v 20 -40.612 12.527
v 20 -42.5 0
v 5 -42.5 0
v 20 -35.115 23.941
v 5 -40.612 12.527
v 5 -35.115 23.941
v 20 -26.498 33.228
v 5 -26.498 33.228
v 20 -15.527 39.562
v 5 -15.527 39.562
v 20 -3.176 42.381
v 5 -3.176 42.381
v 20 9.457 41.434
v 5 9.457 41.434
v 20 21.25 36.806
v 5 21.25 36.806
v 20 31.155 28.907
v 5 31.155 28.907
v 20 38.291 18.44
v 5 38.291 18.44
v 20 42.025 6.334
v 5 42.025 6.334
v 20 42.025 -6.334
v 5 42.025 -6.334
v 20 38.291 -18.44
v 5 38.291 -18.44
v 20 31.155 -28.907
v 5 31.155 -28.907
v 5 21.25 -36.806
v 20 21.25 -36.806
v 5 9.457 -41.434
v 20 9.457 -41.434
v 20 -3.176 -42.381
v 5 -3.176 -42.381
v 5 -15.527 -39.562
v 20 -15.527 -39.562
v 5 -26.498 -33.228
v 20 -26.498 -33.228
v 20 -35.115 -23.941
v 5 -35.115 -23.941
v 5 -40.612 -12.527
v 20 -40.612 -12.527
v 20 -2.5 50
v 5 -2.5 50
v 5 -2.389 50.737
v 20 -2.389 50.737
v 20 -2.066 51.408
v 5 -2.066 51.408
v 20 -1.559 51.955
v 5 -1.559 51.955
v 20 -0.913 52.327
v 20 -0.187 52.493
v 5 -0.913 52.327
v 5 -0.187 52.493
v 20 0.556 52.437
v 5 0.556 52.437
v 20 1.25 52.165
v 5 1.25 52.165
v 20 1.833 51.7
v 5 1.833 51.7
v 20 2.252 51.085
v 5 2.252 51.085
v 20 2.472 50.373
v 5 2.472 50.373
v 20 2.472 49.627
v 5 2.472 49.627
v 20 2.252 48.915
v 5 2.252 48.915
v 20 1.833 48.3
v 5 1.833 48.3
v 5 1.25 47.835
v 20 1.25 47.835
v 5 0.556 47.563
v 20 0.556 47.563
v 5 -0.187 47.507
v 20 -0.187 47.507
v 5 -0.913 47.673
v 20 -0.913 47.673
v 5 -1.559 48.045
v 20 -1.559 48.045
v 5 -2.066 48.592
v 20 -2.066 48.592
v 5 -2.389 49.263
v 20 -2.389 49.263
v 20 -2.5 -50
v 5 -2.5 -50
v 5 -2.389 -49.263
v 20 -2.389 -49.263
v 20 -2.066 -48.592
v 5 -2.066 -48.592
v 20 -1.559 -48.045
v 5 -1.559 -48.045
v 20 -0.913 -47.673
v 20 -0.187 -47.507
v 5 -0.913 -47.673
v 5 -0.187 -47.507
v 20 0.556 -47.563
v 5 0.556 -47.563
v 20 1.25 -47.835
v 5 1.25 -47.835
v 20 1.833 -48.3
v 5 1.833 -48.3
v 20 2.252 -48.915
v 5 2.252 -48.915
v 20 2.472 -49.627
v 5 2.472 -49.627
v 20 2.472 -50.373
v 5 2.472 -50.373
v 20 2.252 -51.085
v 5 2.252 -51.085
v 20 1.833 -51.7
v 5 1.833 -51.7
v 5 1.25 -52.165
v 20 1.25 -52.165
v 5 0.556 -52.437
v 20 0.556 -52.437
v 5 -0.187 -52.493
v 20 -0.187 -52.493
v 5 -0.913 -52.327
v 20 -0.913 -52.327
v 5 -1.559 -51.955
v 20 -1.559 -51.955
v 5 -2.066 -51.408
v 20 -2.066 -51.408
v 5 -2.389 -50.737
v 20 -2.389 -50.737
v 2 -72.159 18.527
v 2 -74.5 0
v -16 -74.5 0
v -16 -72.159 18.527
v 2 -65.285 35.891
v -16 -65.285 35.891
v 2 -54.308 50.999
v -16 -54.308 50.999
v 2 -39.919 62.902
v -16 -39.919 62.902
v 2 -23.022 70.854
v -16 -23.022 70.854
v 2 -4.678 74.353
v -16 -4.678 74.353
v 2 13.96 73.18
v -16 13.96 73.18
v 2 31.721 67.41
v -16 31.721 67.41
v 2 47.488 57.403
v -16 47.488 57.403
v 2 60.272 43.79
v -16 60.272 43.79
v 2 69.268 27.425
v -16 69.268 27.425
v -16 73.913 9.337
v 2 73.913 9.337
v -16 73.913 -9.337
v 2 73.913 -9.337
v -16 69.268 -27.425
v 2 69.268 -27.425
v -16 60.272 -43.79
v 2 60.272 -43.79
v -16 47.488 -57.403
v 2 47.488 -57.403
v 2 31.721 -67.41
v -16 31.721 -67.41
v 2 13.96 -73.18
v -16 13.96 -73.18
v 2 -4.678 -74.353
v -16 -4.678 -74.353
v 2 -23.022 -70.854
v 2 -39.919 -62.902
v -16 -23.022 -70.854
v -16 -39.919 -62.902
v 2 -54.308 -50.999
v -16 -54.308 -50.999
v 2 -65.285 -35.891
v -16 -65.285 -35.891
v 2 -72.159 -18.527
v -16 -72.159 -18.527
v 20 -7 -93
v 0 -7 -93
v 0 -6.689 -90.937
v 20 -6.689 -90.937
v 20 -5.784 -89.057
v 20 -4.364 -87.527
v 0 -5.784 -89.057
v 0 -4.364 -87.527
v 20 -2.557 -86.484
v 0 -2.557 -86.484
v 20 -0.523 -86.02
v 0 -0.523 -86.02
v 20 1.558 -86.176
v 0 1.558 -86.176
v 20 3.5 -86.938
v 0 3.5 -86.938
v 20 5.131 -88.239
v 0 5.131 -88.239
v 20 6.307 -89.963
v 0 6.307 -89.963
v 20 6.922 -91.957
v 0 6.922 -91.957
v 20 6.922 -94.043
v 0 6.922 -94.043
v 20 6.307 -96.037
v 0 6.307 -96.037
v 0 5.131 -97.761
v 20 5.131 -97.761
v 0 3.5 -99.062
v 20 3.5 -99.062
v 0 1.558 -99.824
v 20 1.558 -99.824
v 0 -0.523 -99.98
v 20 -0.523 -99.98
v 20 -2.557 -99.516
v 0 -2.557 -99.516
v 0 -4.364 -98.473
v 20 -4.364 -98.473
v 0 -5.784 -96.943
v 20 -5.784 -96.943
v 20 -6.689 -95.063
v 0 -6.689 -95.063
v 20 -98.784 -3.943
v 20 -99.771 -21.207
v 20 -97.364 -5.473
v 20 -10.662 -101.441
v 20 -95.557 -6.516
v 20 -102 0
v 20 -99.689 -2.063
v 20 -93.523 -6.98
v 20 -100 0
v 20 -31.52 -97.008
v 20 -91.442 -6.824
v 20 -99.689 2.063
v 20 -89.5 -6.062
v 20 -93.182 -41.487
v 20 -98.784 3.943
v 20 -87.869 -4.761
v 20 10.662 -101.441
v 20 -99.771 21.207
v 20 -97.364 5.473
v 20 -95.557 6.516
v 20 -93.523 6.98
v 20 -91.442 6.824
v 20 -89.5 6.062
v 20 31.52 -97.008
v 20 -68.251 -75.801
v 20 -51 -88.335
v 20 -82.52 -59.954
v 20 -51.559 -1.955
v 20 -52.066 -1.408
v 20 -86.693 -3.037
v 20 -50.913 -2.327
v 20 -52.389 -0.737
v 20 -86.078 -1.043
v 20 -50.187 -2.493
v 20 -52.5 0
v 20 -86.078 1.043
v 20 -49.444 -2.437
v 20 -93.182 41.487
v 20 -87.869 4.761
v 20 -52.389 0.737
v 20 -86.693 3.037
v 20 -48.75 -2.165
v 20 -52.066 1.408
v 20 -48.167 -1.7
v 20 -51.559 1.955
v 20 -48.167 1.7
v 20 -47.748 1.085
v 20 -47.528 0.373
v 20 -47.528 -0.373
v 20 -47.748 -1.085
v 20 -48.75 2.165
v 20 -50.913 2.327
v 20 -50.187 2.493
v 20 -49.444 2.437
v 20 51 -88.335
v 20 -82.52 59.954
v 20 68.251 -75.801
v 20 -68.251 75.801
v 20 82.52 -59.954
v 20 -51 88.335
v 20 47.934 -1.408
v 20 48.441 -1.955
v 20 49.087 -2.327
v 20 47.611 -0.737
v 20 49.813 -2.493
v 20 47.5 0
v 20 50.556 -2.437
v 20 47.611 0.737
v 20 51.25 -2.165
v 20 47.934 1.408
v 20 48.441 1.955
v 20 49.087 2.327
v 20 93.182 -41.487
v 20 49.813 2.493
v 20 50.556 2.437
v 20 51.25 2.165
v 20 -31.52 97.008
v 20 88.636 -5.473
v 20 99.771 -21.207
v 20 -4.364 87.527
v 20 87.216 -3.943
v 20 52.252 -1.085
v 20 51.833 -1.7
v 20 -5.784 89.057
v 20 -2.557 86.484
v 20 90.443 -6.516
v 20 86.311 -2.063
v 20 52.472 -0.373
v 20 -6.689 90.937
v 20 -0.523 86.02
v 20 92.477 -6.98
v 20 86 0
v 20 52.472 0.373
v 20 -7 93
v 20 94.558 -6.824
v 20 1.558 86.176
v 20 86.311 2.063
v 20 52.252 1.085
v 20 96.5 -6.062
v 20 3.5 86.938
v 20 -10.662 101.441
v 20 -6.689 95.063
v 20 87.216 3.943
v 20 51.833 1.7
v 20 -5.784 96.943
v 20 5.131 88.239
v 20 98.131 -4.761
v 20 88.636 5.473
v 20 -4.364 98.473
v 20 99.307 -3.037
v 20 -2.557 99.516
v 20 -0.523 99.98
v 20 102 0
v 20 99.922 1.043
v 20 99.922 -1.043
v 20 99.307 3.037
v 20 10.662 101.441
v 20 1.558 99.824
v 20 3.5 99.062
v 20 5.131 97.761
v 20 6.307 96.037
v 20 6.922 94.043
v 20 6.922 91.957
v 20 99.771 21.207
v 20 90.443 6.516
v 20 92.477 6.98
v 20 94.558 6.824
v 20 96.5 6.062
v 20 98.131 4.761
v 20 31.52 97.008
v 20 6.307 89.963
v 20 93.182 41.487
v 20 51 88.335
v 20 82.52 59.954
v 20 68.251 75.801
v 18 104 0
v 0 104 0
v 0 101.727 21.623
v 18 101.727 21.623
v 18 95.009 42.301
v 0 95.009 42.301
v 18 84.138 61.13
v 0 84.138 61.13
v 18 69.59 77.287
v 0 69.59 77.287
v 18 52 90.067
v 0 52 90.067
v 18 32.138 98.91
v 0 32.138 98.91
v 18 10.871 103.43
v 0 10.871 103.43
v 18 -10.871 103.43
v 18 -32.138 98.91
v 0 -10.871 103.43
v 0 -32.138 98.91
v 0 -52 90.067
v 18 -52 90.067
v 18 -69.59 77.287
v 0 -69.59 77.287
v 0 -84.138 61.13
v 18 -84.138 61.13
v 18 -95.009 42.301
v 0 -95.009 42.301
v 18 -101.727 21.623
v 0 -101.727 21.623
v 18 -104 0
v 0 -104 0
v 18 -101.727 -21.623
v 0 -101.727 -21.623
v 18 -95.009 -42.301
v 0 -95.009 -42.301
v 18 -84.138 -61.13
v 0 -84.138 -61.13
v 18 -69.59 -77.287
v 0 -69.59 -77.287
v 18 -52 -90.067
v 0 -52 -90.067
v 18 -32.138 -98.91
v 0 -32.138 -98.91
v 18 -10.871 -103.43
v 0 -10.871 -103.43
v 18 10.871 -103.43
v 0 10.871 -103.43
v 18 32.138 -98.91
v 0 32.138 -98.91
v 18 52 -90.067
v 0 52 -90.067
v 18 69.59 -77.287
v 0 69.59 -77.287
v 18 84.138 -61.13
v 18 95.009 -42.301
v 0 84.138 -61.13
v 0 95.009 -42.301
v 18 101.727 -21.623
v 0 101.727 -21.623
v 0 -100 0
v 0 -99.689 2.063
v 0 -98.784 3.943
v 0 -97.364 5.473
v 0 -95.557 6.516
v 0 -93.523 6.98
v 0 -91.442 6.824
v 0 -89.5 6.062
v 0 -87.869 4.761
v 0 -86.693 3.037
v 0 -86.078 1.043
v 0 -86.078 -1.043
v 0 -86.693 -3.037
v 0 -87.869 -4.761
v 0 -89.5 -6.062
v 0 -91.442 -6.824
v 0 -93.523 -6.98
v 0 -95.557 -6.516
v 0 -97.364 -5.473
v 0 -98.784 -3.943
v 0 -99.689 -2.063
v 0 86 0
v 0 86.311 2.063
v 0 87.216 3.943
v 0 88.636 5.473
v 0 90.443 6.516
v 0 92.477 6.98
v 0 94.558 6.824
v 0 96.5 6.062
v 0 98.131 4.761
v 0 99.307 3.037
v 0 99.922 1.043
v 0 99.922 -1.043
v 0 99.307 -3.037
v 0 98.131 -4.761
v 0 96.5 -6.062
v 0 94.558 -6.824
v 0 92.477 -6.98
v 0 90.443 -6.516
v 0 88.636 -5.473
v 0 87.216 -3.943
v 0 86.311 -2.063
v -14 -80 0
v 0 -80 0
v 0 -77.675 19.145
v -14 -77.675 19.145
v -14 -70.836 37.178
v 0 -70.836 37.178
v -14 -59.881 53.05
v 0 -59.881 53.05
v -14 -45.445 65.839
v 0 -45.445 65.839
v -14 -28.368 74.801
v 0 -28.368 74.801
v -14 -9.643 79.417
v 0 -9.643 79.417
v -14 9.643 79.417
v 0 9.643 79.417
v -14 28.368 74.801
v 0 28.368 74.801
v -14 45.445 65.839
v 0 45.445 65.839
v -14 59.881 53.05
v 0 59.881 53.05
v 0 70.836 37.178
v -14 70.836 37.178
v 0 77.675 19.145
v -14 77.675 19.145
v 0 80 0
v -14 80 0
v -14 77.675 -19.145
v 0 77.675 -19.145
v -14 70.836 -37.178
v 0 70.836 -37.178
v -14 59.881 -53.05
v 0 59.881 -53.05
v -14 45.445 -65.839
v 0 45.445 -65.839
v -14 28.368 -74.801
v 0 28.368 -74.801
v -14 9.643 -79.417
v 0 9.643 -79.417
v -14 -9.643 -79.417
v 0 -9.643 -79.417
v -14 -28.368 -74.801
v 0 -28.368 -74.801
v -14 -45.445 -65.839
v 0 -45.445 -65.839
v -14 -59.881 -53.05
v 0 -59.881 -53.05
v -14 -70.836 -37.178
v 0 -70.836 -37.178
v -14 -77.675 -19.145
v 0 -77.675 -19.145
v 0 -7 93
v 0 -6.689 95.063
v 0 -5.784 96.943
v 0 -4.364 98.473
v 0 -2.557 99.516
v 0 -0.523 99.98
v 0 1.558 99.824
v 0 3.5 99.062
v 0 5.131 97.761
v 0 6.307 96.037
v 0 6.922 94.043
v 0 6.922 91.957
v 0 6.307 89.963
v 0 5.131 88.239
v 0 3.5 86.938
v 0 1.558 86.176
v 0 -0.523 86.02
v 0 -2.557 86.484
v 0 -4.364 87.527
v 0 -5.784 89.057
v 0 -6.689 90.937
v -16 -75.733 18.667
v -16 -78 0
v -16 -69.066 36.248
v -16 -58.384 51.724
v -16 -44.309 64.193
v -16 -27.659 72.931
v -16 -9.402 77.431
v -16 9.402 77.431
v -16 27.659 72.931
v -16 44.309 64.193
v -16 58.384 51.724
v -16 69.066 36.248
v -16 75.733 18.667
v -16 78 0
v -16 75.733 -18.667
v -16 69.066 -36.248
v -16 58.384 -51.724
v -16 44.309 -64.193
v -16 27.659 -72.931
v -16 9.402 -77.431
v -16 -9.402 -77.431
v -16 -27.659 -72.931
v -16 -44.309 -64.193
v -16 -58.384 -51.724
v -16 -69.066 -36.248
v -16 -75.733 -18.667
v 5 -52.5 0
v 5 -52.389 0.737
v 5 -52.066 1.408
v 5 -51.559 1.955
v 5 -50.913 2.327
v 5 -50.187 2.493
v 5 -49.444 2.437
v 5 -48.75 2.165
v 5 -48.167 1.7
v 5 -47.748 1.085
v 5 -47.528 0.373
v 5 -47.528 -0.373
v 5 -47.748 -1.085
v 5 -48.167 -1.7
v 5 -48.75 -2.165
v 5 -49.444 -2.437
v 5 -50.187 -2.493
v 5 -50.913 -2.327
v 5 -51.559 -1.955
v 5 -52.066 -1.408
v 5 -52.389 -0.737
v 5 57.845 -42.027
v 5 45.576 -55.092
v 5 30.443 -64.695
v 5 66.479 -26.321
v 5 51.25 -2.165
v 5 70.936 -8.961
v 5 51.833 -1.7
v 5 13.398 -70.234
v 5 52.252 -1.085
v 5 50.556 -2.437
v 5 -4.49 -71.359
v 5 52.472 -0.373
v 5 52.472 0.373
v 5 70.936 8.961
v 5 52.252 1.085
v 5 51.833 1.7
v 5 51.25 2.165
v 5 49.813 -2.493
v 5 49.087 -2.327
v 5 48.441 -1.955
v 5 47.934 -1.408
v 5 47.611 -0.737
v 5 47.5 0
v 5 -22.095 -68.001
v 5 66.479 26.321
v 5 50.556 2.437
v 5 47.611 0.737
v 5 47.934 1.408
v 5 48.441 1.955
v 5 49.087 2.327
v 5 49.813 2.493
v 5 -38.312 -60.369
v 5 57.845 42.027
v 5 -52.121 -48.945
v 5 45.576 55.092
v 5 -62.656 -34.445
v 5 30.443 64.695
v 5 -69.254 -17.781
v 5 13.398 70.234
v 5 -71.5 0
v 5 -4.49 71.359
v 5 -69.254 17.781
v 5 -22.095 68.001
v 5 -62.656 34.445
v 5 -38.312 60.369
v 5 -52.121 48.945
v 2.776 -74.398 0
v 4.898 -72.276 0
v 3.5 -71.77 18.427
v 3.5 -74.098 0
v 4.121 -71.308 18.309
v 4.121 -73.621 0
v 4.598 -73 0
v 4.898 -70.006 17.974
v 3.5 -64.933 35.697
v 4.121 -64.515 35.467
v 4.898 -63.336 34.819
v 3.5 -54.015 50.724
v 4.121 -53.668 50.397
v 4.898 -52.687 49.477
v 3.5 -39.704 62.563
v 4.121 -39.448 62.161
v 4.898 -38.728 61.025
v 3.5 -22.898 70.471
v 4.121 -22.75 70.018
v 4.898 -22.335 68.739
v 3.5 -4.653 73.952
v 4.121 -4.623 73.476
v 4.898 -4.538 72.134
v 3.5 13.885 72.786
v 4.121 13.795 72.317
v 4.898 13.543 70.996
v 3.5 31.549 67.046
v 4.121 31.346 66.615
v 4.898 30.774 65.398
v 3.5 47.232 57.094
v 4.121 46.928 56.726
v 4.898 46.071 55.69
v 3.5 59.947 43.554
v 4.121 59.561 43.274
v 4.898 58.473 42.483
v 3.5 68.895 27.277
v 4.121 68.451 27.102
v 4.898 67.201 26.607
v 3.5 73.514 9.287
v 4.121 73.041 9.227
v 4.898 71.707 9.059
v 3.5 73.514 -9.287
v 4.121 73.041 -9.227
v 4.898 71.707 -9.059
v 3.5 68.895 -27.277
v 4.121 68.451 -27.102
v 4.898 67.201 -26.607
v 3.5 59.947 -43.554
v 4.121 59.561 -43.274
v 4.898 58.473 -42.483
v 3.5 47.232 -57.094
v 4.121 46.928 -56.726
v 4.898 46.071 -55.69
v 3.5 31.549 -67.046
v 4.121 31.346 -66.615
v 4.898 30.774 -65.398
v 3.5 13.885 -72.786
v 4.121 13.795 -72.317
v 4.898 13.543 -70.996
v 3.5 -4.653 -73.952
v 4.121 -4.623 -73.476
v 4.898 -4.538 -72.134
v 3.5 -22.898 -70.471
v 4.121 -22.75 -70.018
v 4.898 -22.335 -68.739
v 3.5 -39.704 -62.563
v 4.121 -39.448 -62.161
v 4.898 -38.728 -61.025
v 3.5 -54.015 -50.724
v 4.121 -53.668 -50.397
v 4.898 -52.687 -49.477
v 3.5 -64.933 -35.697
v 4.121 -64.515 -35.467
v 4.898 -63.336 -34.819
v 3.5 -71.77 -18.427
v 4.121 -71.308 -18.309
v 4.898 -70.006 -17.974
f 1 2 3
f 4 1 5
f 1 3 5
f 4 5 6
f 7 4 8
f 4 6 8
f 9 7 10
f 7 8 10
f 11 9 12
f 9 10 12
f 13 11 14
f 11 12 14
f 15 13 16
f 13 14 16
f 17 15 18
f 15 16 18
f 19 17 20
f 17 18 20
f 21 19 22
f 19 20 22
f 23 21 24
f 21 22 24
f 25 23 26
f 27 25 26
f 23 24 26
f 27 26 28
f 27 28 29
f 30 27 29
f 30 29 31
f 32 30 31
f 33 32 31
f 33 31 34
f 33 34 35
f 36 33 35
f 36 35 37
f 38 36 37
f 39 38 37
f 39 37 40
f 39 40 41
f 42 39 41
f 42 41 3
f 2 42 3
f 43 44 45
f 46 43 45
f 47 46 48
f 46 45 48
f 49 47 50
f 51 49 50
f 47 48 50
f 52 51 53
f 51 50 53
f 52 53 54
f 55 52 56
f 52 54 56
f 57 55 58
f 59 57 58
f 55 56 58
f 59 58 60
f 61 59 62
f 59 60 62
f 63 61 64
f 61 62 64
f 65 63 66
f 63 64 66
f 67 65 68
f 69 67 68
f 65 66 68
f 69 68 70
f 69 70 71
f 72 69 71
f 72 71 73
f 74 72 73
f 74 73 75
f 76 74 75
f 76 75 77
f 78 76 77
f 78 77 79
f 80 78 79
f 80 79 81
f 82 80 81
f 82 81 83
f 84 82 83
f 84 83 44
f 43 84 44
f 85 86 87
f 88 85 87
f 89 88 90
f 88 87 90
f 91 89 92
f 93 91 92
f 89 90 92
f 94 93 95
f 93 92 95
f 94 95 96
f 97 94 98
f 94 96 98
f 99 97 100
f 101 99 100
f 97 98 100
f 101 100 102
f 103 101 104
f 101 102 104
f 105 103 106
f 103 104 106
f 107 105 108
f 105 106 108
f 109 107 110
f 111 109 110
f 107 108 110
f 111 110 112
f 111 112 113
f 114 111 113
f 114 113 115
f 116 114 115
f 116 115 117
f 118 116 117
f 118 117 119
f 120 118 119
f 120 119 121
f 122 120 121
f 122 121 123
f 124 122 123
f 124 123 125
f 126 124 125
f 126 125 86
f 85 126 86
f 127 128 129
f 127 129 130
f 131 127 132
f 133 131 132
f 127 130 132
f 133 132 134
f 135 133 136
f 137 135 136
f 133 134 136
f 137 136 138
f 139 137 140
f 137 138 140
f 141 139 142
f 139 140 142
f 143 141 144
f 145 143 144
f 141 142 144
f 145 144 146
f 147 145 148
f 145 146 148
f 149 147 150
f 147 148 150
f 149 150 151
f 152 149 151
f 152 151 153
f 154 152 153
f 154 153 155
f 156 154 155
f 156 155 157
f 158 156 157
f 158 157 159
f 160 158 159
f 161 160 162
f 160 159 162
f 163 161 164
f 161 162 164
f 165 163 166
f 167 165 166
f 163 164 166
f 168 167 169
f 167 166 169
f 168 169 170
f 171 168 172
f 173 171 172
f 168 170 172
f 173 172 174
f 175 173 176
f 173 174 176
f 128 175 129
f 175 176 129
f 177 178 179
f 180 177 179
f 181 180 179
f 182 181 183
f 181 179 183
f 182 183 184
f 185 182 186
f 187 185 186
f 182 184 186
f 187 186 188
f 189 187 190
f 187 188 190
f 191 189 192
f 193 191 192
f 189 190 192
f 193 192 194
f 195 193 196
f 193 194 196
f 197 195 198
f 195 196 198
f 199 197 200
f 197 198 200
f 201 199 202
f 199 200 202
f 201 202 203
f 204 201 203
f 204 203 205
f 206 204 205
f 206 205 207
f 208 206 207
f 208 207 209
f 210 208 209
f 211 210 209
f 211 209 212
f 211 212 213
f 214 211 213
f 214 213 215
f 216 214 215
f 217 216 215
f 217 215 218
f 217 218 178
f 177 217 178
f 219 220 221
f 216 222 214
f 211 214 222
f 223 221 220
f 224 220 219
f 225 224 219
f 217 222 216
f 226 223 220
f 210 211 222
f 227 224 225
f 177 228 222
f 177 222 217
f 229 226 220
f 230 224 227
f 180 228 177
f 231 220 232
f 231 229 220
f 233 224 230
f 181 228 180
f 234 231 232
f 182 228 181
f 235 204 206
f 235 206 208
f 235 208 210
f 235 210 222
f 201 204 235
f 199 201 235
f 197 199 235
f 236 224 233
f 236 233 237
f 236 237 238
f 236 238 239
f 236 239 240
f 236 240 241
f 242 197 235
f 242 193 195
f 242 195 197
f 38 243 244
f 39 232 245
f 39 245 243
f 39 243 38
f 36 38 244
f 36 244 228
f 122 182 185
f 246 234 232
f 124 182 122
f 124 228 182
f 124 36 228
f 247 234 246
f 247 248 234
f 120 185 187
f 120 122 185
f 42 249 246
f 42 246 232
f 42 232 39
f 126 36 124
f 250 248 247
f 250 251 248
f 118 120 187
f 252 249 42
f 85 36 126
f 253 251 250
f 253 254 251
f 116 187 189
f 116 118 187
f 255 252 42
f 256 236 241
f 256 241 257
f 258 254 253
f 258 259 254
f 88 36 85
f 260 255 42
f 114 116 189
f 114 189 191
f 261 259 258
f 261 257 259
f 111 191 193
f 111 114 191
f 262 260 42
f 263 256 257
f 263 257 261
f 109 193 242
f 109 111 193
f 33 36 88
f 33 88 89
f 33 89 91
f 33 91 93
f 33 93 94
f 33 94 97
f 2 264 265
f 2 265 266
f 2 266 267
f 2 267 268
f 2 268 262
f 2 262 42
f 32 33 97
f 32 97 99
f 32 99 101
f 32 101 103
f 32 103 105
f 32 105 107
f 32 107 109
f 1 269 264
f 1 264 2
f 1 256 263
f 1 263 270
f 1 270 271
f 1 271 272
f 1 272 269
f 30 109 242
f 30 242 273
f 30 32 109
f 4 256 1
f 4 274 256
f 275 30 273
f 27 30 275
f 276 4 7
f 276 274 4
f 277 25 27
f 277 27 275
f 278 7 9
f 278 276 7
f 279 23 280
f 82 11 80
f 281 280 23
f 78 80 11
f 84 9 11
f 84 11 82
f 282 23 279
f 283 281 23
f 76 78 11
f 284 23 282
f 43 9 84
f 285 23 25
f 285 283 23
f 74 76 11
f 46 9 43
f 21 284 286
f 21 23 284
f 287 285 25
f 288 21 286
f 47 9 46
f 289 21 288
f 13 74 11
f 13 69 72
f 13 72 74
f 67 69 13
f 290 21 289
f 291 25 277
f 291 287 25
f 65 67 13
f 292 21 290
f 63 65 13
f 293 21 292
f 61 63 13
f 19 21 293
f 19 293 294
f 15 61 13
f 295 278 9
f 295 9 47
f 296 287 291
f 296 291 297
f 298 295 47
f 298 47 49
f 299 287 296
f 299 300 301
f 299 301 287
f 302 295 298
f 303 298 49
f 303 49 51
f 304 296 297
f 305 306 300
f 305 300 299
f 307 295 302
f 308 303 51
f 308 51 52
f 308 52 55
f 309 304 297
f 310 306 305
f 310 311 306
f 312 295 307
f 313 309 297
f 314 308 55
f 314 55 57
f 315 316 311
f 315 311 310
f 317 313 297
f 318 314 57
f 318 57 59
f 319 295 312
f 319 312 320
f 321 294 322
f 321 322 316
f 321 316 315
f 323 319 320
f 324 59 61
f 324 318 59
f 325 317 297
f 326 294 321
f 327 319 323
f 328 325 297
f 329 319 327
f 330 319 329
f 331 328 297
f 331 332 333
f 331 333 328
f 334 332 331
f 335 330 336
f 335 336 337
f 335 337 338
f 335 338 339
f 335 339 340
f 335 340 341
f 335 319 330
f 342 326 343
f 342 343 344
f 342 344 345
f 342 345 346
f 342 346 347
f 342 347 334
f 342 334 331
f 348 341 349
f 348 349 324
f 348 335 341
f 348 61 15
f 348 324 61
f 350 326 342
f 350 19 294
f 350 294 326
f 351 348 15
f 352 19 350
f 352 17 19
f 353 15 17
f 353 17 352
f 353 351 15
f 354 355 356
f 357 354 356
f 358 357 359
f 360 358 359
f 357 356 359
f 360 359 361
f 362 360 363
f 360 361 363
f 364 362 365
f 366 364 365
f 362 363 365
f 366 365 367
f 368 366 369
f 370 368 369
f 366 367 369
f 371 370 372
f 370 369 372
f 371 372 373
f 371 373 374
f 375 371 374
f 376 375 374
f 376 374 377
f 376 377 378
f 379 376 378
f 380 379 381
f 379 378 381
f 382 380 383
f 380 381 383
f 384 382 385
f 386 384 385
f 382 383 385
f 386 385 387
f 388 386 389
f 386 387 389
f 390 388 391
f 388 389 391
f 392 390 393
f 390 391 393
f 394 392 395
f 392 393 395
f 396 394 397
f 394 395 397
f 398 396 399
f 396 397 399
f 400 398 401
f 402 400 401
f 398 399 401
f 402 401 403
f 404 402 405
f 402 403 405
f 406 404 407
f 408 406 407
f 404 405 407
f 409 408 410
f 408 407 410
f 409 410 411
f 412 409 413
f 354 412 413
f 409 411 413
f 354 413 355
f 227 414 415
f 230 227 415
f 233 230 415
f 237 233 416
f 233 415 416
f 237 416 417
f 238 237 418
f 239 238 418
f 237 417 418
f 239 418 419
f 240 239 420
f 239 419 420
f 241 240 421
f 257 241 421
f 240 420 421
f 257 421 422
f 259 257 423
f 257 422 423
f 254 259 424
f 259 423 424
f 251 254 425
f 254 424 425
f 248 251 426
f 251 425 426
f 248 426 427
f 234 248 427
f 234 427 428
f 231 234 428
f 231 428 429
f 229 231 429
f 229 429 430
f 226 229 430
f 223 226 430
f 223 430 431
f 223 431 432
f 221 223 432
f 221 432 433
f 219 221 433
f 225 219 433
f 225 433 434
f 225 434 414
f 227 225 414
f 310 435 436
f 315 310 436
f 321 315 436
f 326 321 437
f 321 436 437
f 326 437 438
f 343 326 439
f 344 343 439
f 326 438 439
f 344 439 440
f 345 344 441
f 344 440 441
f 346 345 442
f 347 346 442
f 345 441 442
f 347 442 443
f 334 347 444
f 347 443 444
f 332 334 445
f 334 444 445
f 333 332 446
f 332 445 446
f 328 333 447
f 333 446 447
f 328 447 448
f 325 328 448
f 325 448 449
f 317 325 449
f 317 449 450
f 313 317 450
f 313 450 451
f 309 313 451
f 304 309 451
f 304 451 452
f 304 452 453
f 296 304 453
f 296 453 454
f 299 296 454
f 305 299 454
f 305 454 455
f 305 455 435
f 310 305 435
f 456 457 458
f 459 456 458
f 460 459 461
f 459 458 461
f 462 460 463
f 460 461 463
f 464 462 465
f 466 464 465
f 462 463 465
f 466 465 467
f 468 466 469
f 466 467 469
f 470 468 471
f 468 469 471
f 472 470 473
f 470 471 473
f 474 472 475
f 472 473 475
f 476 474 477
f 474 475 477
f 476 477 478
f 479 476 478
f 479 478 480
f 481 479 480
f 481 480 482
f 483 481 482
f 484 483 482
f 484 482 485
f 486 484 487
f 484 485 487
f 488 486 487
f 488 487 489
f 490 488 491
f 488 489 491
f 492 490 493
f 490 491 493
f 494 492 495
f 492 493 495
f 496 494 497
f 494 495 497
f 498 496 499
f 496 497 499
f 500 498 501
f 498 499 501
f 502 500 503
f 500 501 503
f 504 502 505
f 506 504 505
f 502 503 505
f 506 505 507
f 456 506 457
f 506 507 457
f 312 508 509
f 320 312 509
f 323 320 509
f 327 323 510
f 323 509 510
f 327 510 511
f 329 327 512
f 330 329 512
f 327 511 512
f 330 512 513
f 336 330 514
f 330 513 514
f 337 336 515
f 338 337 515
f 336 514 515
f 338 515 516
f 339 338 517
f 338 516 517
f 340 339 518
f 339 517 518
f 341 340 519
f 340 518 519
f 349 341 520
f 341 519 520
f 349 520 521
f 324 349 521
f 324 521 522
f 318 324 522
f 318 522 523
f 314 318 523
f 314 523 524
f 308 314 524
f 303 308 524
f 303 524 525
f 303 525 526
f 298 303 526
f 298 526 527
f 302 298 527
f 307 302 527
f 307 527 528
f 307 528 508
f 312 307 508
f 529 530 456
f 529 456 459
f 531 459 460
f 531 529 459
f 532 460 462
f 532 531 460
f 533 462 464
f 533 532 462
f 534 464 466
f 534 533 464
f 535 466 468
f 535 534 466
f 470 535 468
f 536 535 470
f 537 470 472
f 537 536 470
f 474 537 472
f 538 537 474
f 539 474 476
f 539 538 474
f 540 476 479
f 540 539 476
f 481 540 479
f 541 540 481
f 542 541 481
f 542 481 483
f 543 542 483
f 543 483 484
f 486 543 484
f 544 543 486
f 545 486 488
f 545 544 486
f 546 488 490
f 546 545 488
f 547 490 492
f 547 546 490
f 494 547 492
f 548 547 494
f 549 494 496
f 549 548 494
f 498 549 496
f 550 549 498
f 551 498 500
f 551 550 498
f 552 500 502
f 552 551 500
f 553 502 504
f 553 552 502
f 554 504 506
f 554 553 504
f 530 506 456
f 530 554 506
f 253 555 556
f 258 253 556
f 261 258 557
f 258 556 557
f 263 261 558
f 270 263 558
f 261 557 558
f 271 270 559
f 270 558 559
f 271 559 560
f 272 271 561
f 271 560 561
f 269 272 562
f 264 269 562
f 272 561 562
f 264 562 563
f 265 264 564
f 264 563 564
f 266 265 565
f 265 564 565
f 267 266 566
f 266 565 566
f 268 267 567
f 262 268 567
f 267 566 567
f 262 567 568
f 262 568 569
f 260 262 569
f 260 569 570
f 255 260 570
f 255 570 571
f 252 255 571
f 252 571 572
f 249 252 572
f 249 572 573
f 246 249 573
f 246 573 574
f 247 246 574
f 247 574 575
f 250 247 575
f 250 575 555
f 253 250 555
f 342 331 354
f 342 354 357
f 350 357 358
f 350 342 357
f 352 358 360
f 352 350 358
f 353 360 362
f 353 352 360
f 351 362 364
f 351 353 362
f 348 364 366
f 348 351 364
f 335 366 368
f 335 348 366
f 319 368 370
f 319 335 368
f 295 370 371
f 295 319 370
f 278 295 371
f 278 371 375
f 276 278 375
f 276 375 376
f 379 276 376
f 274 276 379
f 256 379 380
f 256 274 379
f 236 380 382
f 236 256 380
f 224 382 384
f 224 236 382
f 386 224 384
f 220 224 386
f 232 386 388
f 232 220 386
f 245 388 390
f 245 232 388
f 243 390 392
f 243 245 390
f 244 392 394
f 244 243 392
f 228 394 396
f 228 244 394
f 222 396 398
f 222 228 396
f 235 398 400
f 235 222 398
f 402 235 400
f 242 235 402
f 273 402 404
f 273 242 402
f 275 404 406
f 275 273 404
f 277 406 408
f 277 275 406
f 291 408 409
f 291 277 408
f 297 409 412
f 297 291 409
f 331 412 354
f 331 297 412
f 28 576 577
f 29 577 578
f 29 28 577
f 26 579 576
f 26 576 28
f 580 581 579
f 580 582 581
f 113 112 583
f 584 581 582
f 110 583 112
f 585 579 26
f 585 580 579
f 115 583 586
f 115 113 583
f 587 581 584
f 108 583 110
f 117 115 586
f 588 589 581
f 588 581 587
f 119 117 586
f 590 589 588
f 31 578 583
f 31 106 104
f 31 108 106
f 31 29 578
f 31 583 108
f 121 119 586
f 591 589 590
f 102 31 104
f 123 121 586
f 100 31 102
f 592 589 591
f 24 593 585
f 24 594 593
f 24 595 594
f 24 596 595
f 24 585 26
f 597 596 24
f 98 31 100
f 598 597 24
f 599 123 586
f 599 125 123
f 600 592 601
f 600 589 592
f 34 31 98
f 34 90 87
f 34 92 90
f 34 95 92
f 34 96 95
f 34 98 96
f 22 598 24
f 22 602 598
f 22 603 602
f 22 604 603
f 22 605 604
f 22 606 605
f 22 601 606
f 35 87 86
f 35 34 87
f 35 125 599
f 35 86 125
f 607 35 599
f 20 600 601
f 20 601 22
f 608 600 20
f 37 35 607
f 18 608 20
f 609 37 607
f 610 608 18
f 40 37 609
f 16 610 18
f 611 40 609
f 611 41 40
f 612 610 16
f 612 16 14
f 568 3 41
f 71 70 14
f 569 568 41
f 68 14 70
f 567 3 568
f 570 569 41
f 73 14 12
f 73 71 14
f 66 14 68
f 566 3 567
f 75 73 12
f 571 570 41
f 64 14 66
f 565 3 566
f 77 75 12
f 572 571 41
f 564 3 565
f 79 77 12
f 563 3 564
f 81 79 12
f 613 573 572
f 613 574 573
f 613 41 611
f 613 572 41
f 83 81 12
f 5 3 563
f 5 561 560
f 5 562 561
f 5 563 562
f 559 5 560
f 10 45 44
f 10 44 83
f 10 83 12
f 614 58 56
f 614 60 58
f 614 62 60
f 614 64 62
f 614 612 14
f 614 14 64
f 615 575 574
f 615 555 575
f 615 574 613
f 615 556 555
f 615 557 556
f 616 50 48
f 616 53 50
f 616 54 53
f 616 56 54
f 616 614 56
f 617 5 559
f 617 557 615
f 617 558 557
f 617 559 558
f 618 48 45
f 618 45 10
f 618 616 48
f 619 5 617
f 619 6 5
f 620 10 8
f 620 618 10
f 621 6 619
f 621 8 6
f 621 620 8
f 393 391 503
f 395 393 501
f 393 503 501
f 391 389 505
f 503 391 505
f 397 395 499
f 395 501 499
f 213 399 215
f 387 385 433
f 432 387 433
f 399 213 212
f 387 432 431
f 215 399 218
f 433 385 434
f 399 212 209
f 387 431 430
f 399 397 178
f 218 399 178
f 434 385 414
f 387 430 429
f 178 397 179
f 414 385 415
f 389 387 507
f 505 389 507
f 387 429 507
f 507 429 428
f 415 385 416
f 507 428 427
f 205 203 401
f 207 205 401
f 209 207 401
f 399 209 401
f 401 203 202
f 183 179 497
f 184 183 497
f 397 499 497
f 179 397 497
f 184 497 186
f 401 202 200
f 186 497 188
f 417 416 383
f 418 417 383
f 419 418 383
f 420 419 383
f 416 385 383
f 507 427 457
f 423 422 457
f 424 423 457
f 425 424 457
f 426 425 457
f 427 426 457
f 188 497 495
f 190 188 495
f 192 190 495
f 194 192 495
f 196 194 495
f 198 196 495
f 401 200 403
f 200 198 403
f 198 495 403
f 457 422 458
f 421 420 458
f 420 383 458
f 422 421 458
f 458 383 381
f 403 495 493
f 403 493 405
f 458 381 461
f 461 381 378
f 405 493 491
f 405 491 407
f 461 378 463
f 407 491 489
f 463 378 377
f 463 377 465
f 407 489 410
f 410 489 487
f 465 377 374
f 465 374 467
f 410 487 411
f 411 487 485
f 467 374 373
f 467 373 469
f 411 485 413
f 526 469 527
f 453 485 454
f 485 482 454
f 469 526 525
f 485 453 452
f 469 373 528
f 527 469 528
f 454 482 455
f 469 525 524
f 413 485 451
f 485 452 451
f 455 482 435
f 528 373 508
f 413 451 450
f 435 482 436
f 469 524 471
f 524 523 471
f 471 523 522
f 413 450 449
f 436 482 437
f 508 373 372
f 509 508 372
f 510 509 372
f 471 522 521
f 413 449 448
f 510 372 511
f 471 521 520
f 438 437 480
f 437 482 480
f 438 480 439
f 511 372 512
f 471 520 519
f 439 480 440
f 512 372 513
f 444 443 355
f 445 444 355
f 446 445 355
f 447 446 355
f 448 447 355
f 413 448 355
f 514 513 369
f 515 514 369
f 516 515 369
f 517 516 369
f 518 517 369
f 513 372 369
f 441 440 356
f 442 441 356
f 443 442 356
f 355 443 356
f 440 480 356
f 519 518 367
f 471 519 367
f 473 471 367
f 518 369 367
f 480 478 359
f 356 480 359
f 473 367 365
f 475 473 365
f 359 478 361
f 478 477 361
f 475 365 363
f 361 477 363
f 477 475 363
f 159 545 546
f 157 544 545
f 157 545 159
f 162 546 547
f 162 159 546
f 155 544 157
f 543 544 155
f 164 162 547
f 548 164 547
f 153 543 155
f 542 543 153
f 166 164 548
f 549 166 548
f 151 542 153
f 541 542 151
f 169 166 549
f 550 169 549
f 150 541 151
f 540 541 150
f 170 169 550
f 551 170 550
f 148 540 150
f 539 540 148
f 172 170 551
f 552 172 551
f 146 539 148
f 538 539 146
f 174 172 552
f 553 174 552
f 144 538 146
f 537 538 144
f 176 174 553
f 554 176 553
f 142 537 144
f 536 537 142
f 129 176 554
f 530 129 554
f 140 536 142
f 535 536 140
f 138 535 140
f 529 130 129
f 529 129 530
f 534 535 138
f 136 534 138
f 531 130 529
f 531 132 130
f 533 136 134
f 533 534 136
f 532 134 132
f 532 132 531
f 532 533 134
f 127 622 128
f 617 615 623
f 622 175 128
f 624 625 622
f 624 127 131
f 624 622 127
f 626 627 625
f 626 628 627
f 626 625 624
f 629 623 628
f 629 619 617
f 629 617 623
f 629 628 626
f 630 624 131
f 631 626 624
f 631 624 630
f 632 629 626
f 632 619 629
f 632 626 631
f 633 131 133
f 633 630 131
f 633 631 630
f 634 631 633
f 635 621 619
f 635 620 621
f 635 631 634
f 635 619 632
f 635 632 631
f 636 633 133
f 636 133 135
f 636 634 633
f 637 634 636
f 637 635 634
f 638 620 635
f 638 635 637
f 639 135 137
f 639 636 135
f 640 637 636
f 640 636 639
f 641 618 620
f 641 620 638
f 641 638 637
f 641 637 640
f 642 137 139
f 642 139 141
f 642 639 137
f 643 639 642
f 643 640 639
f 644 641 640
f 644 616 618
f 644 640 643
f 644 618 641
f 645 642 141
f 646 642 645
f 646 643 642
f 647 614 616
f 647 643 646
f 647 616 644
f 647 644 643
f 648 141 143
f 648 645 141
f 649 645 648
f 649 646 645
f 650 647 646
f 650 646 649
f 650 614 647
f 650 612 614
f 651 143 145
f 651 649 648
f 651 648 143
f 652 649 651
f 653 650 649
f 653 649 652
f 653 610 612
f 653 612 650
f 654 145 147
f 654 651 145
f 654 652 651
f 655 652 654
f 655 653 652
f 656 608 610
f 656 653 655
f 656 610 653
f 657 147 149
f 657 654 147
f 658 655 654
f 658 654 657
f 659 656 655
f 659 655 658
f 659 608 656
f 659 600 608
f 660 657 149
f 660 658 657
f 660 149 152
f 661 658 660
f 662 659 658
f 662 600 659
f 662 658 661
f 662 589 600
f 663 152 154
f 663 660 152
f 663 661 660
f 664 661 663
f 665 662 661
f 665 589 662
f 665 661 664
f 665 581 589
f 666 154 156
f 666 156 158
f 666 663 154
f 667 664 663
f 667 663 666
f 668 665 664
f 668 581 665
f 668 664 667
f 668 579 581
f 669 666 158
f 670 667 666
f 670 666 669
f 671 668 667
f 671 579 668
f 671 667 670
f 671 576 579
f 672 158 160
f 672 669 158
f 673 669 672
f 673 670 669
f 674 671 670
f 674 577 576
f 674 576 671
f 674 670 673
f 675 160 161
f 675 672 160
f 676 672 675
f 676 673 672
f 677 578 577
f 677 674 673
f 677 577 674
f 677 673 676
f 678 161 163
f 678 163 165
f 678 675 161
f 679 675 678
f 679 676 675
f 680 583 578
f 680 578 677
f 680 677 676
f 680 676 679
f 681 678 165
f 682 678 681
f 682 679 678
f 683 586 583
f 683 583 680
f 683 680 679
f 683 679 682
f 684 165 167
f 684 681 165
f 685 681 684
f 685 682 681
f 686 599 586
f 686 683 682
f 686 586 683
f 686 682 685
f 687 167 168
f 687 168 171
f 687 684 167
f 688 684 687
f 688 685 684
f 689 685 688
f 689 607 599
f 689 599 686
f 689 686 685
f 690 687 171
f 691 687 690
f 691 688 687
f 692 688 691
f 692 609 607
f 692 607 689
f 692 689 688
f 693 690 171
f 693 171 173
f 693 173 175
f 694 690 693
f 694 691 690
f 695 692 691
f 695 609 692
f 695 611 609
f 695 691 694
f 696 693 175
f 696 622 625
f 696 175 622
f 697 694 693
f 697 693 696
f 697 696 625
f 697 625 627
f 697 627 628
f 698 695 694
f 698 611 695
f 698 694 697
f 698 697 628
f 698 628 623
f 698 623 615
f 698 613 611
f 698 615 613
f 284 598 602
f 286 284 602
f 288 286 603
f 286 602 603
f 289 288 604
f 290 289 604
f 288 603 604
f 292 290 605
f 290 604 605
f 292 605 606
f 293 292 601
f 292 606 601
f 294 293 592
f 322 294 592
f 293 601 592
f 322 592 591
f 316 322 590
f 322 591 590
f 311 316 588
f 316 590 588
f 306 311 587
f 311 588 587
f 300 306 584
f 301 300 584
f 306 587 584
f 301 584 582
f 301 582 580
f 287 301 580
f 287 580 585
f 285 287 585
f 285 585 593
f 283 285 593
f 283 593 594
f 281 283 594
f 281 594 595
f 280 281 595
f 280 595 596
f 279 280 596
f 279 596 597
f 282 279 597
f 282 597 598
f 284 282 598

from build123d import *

# Parameters (mm, degrees)
F0_R     = 104
F1_DEPTH = 20
F2_R     = 80
F3_DEPTH = 16
F4_SIZE  = 2
F5_R     = 74.5
F6_DEPTH = 21
F7_R     = 3
F9_D     = 85
F11_D    = 5
F13_D    = 14


with BuildPart() as f1:
    # F0 (on Right) → F1 (new body)
    with BuildSketch(Plane.YZ):
        Circle(F0_R)
    extrude(amount=F1_DEPTH)

    # F2 (on face) → F3 (join)
    with BuildSketch(Plane(origin=(0, 0, 0), x_dir=(0, -1, 0), z_dir=(-1, 0, 0))):
        Circle(F2_R)
    extrude(amount=F3_DEPTH)

    # F4
    f4_edges = [f1.edges().sort_by_distance(p)[0] for p in [
        (-16, 80, 0),
        (20, -104, 0),
    ]]
    chamfer(f4_edges, length=F4_SIZE)

    # F5 (on face) → F6 (cut)
    with BuildSketch(Plane(origin=(-16, 0, 0), x_dir=(0, -1, 0), z_dir=(-1, 0, 0))):
        Circle(F5_R)
    extrude(amount=-F6_DEPTH, mode=Mode.SUBTRACT)

    # F7
    f7_edges = [f1.edges().sort_by_distance(p)[0] for p in [
        (5, 74.5, 0),
    ]]
    fillet(f7_edges, radius=F7_R)

    # F9 (through all)
    with Locations(Plane.YZ.offset(20)):
        with Locations((0, 0)):
            Hole(F9_D / 2)

    # F11 (through all)
    with Locations(Plane.YZ.offset(20)):
        with Locations((0, 50), (50, 0), (0, -50), (-50, 0)):
            Hole(F11_D / 2)

    # F13 (through all)
    with Locations(Plane.YZ.offset(20)):
        with Locations((0, 93), (93, 0), (0, -93), (-93, 0)):
            Hole(F13_D / 2)


solid = f1.part
